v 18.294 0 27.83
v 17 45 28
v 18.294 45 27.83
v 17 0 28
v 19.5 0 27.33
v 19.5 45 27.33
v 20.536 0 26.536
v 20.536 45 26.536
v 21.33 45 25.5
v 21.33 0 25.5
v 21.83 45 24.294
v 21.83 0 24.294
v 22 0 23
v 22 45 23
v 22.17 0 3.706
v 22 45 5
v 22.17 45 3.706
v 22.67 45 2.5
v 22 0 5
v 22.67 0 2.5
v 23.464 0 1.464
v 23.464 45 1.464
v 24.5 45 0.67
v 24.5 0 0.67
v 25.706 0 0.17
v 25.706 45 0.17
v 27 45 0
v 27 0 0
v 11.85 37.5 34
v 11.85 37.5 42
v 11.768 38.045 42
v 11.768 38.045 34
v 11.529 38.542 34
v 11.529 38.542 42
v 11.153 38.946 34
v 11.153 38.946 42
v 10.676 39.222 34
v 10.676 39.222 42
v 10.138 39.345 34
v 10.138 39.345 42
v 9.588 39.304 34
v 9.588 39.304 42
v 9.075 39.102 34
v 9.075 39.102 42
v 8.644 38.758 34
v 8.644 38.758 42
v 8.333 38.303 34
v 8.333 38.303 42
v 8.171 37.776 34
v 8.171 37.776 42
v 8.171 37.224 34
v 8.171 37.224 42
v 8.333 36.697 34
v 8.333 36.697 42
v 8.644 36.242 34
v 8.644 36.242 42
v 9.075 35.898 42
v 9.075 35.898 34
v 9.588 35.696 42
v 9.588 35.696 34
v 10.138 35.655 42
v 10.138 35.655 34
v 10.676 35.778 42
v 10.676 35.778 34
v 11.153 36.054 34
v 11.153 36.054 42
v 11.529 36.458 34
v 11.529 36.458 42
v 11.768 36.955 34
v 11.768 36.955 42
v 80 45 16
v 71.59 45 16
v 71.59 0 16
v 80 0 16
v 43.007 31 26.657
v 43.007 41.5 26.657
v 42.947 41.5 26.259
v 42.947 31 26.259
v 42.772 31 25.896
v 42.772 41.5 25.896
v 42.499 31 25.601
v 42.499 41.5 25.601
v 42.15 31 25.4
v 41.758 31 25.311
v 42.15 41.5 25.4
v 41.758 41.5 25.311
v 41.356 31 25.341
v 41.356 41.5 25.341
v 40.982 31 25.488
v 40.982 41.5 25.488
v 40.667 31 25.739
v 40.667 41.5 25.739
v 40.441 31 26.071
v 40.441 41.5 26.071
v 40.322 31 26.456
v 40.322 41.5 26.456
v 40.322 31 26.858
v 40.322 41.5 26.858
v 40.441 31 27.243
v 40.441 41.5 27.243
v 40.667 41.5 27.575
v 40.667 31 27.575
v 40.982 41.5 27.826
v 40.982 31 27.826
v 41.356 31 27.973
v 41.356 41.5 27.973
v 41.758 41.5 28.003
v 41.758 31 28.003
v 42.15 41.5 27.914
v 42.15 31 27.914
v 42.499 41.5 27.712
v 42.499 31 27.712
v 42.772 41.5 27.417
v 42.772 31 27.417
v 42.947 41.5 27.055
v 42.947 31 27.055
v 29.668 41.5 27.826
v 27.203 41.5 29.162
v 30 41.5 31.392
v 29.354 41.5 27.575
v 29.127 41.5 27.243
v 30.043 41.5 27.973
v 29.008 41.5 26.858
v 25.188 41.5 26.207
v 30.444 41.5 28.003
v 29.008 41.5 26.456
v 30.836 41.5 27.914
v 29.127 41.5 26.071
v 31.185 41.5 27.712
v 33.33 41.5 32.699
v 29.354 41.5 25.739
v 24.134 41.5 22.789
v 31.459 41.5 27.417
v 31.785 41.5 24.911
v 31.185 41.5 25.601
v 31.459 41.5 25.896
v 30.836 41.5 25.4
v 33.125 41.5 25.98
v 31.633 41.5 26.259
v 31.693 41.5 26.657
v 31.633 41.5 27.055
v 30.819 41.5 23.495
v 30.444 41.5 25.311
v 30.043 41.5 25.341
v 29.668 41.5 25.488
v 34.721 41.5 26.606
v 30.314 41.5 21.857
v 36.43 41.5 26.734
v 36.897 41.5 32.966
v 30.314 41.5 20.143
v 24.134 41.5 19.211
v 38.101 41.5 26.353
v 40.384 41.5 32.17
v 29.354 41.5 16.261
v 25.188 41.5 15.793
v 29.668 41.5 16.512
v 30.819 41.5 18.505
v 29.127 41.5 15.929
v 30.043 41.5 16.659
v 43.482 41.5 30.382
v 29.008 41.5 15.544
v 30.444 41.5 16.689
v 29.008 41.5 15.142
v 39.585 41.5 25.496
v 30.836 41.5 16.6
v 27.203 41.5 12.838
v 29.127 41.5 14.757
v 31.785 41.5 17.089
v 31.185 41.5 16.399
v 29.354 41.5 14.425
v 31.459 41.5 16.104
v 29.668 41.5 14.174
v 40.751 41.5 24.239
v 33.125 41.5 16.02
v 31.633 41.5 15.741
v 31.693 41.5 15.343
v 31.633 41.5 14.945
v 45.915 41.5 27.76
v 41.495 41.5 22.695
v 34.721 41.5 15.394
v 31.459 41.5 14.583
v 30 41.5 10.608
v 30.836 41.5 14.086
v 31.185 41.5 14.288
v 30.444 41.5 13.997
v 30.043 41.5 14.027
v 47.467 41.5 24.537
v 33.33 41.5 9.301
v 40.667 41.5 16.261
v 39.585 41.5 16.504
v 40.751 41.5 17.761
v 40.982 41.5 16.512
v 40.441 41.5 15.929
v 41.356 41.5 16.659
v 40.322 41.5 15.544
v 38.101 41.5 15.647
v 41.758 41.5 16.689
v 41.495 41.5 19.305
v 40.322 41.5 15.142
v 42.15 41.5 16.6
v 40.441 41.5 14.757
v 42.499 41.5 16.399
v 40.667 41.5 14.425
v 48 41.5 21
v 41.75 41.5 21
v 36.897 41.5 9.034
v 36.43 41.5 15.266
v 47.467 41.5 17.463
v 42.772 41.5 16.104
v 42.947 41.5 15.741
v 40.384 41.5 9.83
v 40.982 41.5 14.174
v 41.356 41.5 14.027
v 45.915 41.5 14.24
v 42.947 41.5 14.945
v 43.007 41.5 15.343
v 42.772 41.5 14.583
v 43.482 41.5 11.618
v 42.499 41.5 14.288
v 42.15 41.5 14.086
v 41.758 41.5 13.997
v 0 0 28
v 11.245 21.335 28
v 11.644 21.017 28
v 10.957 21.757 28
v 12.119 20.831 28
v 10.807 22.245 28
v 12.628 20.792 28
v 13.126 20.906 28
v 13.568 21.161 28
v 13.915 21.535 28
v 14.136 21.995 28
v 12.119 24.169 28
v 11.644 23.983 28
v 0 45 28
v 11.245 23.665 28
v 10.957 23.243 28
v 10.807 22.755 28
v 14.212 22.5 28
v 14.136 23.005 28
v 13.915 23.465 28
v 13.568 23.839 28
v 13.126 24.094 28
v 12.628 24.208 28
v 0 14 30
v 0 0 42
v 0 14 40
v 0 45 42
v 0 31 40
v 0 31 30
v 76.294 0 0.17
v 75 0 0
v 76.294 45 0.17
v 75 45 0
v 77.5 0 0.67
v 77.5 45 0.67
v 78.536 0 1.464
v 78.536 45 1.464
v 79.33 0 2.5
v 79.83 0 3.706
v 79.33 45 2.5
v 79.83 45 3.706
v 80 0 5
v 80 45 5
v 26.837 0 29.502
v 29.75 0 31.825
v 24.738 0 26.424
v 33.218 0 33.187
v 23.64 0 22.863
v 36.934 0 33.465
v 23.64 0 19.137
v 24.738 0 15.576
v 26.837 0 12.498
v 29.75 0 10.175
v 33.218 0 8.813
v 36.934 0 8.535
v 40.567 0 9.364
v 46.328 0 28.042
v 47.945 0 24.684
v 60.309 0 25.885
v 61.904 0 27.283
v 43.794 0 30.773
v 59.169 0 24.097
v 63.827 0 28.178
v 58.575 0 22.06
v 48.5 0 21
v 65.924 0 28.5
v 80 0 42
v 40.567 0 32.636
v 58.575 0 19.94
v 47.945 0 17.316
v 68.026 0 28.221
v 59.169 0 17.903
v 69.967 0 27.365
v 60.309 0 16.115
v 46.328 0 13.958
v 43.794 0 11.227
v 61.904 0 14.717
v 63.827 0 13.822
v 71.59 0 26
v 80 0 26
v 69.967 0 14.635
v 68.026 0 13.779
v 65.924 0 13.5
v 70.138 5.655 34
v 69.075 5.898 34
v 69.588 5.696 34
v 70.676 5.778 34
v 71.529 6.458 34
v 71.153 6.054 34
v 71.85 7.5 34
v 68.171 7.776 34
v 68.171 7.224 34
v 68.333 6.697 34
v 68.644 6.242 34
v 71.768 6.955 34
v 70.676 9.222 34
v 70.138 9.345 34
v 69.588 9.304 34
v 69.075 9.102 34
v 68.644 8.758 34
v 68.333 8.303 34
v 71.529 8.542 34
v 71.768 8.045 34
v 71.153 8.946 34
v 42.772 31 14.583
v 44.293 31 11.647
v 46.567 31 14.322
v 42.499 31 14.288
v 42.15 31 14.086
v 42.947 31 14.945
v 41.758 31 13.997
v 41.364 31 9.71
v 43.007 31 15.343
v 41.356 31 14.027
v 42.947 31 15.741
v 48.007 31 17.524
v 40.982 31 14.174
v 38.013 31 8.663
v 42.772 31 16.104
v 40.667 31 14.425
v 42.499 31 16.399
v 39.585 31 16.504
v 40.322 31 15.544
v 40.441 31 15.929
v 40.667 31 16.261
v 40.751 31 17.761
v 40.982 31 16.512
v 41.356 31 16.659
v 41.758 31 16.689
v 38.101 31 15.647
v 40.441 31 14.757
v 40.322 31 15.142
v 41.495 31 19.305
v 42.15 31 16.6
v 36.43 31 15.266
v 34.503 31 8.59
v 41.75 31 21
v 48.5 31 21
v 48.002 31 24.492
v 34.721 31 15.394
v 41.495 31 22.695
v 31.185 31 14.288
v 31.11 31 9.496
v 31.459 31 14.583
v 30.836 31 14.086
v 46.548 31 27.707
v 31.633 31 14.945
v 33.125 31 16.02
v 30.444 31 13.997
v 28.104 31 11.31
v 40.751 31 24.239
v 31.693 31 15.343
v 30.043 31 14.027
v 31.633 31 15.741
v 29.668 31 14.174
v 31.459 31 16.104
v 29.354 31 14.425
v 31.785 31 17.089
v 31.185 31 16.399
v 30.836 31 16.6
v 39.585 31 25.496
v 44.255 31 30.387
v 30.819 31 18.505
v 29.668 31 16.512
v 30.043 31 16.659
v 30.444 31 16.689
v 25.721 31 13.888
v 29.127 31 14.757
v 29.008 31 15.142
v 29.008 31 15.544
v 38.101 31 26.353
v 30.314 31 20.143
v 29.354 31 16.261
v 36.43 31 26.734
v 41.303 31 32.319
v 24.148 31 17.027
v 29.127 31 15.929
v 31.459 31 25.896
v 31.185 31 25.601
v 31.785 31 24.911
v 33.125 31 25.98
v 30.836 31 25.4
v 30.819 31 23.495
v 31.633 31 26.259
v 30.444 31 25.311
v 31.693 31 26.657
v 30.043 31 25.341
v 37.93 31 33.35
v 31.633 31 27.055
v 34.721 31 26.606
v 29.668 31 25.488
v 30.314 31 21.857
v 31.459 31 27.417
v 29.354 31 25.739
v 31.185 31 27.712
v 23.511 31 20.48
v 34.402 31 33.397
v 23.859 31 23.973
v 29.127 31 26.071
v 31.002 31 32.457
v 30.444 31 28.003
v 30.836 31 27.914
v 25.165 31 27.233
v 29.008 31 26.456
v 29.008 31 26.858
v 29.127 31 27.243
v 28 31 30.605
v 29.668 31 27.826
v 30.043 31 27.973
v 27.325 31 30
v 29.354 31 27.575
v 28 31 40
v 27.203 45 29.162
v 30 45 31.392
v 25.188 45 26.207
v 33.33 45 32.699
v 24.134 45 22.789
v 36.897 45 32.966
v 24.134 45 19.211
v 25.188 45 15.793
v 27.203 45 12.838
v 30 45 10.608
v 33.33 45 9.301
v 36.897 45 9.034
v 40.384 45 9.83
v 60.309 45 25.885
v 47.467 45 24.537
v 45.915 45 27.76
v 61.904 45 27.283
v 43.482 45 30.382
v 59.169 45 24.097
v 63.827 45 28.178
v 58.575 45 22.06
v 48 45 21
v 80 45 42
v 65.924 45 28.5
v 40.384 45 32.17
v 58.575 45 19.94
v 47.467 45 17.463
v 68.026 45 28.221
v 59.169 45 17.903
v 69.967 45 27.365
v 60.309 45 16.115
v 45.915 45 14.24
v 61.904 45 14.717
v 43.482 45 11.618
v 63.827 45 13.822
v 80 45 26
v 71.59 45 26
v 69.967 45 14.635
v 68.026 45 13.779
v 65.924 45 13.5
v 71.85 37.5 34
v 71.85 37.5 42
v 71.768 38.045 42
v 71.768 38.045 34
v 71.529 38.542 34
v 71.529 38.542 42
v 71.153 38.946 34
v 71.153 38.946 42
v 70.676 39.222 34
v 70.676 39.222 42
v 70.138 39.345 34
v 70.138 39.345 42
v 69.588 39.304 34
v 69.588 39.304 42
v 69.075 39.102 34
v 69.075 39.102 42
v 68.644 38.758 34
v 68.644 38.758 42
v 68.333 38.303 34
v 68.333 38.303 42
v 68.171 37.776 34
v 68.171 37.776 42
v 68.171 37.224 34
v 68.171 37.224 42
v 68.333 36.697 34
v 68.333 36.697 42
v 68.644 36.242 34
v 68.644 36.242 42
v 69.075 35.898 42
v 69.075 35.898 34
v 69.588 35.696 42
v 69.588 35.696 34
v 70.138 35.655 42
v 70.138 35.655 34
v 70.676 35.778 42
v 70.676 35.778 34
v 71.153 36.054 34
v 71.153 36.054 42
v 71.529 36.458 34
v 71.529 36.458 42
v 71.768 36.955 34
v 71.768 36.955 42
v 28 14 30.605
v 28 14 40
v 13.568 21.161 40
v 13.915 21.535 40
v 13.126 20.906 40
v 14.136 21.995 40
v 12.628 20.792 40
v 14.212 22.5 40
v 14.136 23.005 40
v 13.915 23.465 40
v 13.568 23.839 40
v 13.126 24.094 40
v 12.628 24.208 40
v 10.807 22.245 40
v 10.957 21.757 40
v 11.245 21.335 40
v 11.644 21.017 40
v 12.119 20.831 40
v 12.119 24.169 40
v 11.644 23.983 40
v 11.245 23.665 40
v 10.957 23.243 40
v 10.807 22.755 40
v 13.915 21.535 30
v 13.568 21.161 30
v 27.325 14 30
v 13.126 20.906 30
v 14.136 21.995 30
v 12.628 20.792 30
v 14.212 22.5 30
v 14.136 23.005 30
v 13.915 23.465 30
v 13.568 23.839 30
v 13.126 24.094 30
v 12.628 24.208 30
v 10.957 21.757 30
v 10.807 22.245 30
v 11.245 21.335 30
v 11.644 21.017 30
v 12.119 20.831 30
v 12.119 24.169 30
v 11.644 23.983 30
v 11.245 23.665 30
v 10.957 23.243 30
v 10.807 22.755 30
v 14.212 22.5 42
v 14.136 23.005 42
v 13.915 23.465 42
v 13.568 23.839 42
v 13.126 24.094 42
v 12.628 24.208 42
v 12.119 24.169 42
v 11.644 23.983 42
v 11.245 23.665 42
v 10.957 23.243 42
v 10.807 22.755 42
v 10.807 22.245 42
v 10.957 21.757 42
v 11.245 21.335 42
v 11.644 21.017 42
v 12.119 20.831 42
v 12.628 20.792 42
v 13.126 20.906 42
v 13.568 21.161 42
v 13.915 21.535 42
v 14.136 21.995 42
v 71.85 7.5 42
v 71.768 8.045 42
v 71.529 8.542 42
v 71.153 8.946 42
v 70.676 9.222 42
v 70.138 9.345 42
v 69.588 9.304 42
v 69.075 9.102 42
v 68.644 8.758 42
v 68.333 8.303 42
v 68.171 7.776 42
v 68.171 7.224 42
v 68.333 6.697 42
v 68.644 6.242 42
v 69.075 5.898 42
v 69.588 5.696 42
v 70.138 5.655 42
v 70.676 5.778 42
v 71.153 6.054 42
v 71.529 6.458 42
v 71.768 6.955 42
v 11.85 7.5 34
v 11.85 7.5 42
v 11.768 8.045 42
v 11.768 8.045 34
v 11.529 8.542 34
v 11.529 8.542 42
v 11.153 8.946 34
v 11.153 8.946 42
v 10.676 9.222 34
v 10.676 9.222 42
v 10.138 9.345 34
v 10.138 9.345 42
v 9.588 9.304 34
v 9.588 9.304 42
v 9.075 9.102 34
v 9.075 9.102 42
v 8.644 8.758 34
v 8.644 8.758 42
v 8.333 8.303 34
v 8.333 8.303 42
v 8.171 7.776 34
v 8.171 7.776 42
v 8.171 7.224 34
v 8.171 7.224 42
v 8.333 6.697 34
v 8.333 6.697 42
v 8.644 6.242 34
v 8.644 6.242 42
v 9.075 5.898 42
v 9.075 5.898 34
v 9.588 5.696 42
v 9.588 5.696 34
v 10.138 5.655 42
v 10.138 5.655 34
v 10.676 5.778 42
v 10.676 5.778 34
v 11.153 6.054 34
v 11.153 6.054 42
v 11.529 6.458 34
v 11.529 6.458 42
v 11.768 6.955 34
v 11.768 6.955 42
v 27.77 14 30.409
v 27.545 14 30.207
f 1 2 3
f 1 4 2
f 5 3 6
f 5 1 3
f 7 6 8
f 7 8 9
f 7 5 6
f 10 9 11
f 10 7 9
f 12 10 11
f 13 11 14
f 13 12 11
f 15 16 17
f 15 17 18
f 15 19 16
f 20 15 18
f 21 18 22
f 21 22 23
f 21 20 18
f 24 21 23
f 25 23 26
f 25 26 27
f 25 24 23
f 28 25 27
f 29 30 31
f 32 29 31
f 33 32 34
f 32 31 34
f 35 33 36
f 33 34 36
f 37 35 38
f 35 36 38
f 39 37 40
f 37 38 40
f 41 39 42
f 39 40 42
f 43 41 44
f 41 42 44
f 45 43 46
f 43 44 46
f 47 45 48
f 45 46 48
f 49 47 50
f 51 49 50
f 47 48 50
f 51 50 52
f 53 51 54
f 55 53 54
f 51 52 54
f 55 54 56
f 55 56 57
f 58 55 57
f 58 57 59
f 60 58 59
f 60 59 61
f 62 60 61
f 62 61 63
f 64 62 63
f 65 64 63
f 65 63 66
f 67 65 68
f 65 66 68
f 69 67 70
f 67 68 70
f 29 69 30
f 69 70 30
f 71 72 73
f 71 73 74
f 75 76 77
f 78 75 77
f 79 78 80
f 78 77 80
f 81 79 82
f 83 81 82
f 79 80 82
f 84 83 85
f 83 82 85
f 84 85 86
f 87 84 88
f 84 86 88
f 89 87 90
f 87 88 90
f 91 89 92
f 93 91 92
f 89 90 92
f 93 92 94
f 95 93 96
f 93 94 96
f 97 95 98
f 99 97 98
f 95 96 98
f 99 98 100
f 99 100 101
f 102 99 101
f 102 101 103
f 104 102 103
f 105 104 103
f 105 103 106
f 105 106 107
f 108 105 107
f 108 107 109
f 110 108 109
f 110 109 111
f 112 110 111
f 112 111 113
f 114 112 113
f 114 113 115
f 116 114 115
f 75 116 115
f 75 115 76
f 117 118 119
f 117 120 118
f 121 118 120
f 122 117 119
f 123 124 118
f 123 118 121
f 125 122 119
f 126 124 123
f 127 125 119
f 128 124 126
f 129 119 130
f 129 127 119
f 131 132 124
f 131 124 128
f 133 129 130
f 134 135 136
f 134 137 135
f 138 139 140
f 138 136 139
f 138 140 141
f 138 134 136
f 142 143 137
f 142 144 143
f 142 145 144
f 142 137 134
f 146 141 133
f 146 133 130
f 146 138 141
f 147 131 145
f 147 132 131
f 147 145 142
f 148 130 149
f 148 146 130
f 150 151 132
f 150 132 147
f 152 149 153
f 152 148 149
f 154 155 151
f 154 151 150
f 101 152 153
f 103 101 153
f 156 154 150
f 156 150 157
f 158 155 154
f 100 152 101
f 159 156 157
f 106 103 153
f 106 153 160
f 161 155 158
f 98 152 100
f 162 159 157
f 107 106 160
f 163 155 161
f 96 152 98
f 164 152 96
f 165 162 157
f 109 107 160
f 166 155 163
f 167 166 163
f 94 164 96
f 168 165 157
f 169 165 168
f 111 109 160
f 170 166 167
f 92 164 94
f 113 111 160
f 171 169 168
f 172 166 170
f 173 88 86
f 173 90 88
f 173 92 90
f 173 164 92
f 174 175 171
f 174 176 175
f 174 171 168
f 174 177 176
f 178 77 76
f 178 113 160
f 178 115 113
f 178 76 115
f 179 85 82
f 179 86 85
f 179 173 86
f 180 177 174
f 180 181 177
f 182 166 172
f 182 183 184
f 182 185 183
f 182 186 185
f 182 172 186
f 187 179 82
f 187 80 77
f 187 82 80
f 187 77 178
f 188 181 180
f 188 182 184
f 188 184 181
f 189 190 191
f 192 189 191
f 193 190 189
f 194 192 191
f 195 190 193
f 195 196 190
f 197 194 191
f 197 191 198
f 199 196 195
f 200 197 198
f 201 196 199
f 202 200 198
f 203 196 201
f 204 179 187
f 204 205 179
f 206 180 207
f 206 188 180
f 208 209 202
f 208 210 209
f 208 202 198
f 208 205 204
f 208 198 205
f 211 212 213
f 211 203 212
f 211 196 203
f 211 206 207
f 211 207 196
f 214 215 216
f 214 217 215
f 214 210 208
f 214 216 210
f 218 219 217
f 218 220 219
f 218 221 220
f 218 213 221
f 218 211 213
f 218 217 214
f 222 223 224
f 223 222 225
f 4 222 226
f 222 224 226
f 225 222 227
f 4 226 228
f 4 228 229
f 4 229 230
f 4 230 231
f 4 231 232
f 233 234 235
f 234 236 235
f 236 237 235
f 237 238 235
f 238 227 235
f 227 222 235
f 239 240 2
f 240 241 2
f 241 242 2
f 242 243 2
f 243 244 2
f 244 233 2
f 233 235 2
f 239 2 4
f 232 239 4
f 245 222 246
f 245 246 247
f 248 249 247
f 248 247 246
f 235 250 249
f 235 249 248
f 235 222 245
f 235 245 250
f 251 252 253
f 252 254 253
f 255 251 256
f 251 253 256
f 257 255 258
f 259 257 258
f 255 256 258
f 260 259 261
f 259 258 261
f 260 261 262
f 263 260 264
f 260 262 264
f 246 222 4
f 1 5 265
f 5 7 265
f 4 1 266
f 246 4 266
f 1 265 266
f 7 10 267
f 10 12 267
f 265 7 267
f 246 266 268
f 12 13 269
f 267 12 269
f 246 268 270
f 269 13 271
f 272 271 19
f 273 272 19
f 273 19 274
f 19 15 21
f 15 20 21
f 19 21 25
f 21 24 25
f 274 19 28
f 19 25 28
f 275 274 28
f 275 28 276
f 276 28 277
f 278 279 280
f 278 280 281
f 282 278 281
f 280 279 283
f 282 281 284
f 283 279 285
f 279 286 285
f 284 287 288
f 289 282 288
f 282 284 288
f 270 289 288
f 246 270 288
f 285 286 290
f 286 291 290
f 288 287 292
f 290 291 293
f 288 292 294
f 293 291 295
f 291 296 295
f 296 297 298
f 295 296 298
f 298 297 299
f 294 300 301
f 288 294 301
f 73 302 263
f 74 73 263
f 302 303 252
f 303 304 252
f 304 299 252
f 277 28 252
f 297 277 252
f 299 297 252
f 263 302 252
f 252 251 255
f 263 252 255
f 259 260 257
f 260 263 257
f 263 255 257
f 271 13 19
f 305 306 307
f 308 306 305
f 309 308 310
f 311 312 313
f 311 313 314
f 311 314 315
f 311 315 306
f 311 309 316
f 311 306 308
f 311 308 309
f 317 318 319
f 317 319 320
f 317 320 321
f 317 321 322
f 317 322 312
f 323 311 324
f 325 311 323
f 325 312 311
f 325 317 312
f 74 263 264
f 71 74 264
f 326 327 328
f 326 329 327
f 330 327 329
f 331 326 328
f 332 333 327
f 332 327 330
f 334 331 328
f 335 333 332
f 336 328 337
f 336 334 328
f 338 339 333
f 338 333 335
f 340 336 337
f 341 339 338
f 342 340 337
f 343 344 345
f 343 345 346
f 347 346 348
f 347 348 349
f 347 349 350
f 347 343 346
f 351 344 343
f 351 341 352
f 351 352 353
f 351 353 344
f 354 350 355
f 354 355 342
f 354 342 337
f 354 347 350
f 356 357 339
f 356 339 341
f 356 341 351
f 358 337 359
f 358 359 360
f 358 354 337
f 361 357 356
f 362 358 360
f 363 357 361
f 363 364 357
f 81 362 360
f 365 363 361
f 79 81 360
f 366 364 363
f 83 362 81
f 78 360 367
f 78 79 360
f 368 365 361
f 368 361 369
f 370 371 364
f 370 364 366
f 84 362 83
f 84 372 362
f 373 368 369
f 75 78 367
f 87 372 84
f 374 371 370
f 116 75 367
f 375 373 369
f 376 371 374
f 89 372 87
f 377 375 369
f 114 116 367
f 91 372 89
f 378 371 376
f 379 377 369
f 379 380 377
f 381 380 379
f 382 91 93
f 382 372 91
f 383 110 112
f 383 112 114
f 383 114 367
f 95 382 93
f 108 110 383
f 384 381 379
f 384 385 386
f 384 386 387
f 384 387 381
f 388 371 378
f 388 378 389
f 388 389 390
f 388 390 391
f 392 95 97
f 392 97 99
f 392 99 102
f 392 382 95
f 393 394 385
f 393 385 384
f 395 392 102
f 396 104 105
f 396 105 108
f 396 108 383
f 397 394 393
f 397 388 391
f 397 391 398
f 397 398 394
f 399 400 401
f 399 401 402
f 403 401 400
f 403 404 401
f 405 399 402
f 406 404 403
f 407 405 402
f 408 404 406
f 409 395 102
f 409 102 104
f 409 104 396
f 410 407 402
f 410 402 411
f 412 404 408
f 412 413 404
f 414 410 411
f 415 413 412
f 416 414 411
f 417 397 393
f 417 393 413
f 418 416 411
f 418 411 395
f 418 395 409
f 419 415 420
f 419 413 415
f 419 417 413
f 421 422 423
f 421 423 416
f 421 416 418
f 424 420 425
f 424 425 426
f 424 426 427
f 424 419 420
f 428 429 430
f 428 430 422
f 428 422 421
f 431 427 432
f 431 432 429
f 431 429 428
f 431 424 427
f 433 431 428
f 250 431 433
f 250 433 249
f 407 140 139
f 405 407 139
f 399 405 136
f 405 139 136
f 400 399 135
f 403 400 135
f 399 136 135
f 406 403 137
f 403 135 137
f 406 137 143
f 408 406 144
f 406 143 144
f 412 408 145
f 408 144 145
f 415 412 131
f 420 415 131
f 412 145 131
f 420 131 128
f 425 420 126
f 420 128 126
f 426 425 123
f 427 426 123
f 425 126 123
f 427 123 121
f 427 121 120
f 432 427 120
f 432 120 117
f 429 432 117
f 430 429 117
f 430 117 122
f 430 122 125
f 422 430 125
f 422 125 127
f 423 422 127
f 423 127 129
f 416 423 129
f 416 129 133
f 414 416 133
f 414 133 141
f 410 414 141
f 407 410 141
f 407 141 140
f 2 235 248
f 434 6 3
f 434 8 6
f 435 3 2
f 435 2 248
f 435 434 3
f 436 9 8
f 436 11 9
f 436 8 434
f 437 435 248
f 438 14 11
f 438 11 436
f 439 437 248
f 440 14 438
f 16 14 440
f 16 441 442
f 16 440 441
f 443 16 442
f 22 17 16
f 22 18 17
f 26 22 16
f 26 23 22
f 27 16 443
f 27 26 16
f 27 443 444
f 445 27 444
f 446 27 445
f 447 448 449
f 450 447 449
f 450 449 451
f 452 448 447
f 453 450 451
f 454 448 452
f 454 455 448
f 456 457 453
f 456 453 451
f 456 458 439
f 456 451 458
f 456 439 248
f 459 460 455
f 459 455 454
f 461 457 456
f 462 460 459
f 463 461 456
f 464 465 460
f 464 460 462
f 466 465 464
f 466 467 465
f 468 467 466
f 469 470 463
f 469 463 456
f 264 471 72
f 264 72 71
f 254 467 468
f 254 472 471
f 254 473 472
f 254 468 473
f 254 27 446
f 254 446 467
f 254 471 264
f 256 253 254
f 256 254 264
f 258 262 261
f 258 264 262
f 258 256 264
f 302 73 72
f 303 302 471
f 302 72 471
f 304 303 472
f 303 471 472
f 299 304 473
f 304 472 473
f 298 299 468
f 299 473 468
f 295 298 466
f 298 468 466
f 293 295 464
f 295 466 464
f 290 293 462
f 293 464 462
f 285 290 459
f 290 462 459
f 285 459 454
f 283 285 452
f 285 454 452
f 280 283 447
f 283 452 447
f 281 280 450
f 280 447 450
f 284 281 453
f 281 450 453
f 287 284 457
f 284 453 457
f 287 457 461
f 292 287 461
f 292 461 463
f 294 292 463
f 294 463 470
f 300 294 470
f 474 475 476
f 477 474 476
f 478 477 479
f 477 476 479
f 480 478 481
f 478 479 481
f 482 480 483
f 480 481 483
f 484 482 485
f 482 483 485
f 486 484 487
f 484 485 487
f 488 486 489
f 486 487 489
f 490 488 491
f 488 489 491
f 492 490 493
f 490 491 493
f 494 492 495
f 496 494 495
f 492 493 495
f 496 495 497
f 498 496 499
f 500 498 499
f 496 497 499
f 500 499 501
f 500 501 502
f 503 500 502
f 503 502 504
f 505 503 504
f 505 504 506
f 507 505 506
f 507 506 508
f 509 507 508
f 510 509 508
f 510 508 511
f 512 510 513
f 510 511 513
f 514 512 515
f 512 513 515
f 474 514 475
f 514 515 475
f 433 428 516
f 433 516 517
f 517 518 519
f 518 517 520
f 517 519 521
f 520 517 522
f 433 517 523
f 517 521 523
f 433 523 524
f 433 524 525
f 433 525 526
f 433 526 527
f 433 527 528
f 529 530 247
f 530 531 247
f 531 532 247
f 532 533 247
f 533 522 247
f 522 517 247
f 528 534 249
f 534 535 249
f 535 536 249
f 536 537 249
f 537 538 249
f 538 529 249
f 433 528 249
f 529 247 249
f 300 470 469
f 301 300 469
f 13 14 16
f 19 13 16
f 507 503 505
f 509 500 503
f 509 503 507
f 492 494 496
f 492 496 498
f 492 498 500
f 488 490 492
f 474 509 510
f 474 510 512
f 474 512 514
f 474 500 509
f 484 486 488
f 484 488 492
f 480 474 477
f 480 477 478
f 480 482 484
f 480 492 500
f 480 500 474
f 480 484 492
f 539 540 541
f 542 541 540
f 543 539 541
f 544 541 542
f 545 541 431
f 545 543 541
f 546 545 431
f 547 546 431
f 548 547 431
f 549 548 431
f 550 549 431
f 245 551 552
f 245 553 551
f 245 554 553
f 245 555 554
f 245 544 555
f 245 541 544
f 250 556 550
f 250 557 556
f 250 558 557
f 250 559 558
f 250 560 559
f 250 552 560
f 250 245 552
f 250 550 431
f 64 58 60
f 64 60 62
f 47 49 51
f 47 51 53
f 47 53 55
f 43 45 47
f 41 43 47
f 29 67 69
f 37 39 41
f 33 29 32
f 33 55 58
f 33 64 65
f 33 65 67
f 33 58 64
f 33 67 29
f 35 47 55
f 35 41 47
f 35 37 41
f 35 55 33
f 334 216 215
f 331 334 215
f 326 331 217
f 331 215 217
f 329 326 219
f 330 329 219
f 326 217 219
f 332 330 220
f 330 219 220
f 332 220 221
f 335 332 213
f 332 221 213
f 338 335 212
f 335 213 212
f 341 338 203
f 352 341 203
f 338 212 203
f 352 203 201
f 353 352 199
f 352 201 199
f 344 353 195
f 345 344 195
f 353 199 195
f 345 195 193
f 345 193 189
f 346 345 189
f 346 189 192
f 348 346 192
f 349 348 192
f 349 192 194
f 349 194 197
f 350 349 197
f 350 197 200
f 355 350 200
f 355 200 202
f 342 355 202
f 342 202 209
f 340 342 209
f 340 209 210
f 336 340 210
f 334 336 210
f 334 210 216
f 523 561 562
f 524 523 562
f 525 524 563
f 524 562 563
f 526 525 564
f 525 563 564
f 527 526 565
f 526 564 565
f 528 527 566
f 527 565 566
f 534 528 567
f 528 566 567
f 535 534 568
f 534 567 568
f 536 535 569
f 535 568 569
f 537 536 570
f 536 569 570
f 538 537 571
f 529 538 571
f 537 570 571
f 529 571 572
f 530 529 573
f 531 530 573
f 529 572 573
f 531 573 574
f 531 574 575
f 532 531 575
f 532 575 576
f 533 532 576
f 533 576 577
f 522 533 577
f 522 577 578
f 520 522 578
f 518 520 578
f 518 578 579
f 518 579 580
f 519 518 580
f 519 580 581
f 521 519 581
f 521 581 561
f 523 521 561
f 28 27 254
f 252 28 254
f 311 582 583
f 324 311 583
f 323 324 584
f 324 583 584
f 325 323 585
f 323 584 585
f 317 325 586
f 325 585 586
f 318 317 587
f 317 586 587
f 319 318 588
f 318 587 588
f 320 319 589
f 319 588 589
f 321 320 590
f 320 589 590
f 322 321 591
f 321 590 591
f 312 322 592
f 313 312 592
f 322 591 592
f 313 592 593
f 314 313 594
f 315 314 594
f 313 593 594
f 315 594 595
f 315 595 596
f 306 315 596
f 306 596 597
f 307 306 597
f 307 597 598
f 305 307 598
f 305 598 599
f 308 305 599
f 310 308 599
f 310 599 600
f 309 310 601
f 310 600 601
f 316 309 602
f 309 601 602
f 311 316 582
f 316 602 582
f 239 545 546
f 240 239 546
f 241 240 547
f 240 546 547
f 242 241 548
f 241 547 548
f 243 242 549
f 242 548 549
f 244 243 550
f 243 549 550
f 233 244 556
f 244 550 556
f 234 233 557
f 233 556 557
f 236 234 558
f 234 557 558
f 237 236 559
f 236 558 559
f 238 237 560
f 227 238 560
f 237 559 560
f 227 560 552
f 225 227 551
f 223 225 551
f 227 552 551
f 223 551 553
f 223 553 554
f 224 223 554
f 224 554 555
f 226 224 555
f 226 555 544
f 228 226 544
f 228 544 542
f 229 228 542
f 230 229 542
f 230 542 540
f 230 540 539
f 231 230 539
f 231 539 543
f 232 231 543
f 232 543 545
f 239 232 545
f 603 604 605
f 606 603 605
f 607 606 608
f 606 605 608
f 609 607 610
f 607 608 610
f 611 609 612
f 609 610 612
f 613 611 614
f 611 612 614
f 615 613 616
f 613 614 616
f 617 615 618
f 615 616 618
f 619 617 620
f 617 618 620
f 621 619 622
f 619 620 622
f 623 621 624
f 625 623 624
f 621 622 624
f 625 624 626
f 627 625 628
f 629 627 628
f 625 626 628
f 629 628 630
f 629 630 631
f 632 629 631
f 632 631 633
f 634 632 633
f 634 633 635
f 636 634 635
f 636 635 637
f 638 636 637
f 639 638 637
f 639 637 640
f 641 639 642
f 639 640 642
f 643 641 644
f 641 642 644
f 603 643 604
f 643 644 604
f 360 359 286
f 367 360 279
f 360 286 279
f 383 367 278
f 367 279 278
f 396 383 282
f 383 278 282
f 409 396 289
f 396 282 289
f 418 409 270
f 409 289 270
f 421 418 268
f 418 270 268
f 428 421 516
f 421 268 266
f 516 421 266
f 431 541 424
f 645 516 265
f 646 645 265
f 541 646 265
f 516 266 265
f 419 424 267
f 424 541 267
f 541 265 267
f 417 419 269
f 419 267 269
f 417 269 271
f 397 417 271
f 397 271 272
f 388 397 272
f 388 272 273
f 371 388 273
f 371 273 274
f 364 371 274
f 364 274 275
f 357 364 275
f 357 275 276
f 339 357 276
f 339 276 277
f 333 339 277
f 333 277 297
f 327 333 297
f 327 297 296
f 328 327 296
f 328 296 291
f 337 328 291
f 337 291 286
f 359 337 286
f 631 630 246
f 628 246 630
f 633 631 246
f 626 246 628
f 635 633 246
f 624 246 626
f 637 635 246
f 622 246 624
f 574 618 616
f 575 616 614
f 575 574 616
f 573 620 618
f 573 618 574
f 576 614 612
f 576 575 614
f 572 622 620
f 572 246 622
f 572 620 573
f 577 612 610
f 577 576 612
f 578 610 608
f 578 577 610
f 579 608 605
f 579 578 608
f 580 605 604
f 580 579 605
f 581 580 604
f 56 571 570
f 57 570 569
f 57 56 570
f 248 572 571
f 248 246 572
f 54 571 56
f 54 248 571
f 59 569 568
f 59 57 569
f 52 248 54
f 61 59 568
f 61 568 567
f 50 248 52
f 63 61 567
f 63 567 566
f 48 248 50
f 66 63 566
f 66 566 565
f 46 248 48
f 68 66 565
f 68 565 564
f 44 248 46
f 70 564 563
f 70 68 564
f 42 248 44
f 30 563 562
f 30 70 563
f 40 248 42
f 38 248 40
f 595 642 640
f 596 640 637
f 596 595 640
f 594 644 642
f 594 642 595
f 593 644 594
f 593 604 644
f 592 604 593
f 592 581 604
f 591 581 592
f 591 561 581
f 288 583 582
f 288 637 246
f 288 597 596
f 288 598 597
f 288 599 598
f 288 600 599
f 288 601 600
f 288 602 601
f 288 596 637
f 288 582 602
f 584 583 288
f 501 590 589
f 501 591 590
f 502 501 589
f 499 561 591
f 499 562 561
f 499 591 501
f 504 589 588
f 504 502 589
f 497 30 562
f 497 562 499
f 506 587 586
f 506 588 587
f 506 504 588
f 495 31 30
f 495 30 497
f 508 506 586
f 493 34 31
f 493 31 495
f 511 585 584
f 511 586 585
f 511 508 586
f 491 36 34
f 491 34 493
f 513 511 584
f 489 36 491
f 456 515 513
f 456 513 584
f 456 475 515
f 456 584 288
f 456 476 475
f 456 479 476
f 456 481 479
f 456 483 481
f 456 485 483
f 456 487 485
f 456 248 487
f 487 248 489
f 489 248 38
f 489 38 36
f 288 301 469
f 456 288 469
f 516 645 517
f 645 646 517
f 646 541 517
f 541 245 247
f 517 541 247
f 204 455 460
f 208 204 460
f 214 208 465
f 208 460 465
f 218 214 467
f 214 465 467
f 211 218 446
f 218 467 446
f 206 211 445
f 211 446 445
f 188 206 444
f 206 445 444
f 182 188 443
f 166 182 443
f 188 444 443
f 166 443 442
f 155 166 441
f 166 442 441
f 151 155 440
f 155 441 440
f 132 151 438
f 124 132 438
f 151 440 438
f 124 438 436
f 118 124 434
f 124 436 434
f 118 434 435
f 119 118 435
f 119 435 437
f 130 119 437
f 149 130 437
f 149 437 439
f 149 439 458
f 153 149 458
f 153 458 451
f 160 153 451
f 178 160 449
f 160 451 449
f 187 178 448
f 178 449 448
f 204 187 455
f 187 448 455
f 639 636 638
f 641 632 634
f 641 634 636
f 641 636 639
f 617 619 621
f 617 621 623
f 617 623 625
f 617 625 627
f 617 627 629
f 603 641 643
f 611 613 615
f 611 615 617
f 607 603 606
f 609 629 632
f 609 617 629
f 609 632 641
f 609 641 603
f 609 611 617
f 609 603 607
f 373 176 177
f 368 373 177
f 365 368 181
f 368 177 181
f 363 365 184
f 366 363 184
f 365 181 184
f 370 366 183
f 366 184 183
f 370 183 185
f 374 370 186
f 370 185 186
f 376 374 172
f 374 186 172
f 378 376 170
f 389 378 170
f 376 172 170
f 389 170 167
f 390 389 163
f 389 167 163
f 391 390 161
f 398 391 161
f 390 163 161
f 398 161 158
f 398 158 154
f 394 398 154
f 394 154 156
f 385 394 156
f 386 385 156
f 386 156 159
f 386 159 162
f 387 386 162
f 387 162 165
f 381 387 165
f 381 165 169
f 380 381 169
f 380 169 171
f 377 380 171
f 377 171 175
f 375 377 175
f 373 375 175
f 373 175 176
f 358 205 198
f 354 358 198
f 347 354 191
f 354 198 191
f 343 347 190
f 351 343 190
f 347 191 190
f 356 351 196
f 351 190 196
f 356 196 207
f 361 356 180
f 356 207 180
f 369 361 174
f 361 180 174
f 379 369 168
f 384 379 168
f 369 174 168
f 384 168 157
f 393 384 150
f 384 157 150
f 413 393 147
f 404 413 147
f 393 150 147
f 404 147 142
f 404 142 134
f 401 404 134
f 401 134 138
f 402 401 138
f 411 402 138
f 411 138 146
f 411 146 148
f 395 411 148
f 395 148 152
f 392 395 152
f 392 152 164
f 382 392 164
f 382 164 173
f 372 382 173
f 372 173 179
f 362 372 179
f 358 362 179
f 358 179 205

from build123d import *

# Parameters (mm, degrees)
SKETCH1_W           = 80
SKETCH1_H           = 45
BOSS_EXTRUDE1_DEPTH = 42
SKETCH3_W           = 22
SKETCH3_H           = 28
CUT_EXTRUDE2_DEPTH  = 46
SKETCH4_W           = 10
SKETCH4_H           = 17
CUT_EXTRUDE3_DEPTH  = 28
SKETCH7_R           = 12
CUT_EXTRUDE5_DEPTH  = 3.5
SKETCH11_R          = 1.35
CUT_EXTRUDE6_DEPTH  = 15
SKETCH12_R          = 5.75
CUT_EXTRUDE7_DEPTH  = 42.5
SKETCH13_R          = 7.5
CUT_EXTRUDE8_DEPTH  = 46
SKETCH14_W          = 12.099538741
SKETCH14_H          = 10
CUT_EXTRUDE9_DEPTH  = 46
SKETCH15_R          = 1.712332532
CUT_EXTRUDE10_DEPTH = 43
SKETCH16_R          = 1.85
CUT_EXTRUDE11_DEPTH = 8
FILLET2_R           = 5
SKETCH17_R          = 12.5
CUT_EXTRUDE12_DEPTH = 31


with BuildPart() as part:
    # Sketch1 → Boss-Extrude1 (new body)
    with BuildSketch(Plane.XY):
        with Locations((40, 22.5)):
            Rectangle(SKETCH1_W, SKETCH1_H)
    extrude(amount=BOSS_EXTRUDE1_DEPTH)

    # Sketch3 → Cut-Extrude2 (cut, through all)
    with BuildSketch(Plane(origin=(0, 45, 0), x_dir=(1, 0, 0), z_dir=(0, 1, 0))):
        with Locations((11, -14)):
            Rectangle(SKETCH3_W, SKETCH3_H)
    extrude(amount=-CUT_EXTRUDE2_DEPTH, mode=Mode.SUBTRACT)

    # Sketch4 → Cut-Extrude3 (cut)
    with BuildSketch(Plane.ZY):
        with Locations((35, 22.5)):
            Rectangle(SKETCH4_W, SKETCH4_H)
    extrude(amount=-CUT_EXTRUDE3_DEPTH, mode=Mode.SUBTRACT)

    # Sketch7 → Cut-Extrude5 (cut)
    with BuildSketch(Plane(origin=(0, 45, 0), x_dir=(1, 0, 0), z_dir=(0, 1, 0))):
        with Locations((36, -21)):
            Circle(SKETCH7_R)
    extrude(amount=-CUT_EXTRUDE5_DEPTH, mode=Mode.SUBTRACT)

    # Sketch11 → Cut-Extrude6 (cut)
    with BuildSketch(Plane(origin=(0, 41.5, 0), x_dir=(1, 0, 0), z_dir=(0, 1, 0))):
        with Locations((41.656854249, -15.343145751)):
            Circle(SKETCH11_R)
        with Locations((41.656854249, -26.656854249)):
            Circle(SKETCH11_R)
        with Locations((30.343145751, -26.656854249)):
            Circle(SKETCH11_R)
        with Locations((30.343145751, -15.343145751)):
            Circle(SKETCH11_R)
    extrude(amount=-CUT_EXTRUDE6_DEPTH, mode=Mode.SUBTRACT)

    # Sketch12 → Cut-Extrude7 (cut, through all)
    with BuildSketch(Plane(origin=(0, 41.5, 0), x_dir=(1, 0, 0), z_dir=(0, 1, 0))):
        with Locations((36, -21)):
            Circle(SKETCH12_R)
    extrude(amount=-CUT_EXTRUDE7_DEPTH, mode=Mode.SUBTRACT)

    # Sketch13 → Cut-Extrude8 (cut, through all)
    with BuildSketch(Plane(origin=(0, 45, 0), x_dir=(1, 0, 0), z_dir=(0, 1, 0))):
        with Locations((66, -21)):
            Circle(SKETCH13_R)
    extrude(amount=-CUT_EXTRUDE8_DEPTH, mode=Mode.SUBTRACT)

    # Sketch14 → Cut-Extrude9 (cut, through all)
    with BuildSketch(Plane(origin=(0, 45, 0), x_dir=(1, 0, 0), z_dir=(0, 1, 0))):
        with Locations((73.950230629, -21)):
            Rectangle(SKETCH14_W, SKETCH14_H)
    extrude(amount=-CUT_EXTRUDE9_DEPTH, mode=Mode.SUBTRACT)

    # Sketch15 → Cut-Extrude10 (cut, through all)
    with BuildSketch(Plane.XY.offset(42)):
        with Locations((12.5, 22.500000001)):
            Circle(SKETCH15_R)
    extrude(amount=-CUT_EXTRUDE10_DEPTH, mode=Mode.SUBTRACT)

    # Sketch16 → Cut-Extrude11 (cut)
    with BuildSketch(Plane.XY.offset(42)):
        with Locations((10, 37.5)):
            Circle(SKETCH16_R)
        with Locations((70, 37.5)):
            Circle(SKETCH16_R)
        with Locations((70, 7.5)):
            Circle(SKETCH16_R)
        with Locations((10, 7.5)):
            Circle(SKETCH16_R)
    extrude(amount=-CUT_EXTRUDE11_DEPTH, mode=Mode.SUBTRACT)

    # Fillet2
    fillet2_edges = [part.edges().sort_by_distance(p)[0] for p in [
        (22, 22.5, 0),
        (22, 22.5, 28),
        (80, 22.5, 0),
    ]]
    fillet(fillet2_edges, radius=FILLET2_R)

    # Sketch17 → Cut-Extrude12 (cut)
    with BuildSketch(Plane.XZ):
        with Locations((36, 21)):
            Circle(SKETCH17_R)
    extrude(amount=-CUT_EXTRUDE12_DEPTH, mode=Mode.SUBTRACT)


solid = part.part
